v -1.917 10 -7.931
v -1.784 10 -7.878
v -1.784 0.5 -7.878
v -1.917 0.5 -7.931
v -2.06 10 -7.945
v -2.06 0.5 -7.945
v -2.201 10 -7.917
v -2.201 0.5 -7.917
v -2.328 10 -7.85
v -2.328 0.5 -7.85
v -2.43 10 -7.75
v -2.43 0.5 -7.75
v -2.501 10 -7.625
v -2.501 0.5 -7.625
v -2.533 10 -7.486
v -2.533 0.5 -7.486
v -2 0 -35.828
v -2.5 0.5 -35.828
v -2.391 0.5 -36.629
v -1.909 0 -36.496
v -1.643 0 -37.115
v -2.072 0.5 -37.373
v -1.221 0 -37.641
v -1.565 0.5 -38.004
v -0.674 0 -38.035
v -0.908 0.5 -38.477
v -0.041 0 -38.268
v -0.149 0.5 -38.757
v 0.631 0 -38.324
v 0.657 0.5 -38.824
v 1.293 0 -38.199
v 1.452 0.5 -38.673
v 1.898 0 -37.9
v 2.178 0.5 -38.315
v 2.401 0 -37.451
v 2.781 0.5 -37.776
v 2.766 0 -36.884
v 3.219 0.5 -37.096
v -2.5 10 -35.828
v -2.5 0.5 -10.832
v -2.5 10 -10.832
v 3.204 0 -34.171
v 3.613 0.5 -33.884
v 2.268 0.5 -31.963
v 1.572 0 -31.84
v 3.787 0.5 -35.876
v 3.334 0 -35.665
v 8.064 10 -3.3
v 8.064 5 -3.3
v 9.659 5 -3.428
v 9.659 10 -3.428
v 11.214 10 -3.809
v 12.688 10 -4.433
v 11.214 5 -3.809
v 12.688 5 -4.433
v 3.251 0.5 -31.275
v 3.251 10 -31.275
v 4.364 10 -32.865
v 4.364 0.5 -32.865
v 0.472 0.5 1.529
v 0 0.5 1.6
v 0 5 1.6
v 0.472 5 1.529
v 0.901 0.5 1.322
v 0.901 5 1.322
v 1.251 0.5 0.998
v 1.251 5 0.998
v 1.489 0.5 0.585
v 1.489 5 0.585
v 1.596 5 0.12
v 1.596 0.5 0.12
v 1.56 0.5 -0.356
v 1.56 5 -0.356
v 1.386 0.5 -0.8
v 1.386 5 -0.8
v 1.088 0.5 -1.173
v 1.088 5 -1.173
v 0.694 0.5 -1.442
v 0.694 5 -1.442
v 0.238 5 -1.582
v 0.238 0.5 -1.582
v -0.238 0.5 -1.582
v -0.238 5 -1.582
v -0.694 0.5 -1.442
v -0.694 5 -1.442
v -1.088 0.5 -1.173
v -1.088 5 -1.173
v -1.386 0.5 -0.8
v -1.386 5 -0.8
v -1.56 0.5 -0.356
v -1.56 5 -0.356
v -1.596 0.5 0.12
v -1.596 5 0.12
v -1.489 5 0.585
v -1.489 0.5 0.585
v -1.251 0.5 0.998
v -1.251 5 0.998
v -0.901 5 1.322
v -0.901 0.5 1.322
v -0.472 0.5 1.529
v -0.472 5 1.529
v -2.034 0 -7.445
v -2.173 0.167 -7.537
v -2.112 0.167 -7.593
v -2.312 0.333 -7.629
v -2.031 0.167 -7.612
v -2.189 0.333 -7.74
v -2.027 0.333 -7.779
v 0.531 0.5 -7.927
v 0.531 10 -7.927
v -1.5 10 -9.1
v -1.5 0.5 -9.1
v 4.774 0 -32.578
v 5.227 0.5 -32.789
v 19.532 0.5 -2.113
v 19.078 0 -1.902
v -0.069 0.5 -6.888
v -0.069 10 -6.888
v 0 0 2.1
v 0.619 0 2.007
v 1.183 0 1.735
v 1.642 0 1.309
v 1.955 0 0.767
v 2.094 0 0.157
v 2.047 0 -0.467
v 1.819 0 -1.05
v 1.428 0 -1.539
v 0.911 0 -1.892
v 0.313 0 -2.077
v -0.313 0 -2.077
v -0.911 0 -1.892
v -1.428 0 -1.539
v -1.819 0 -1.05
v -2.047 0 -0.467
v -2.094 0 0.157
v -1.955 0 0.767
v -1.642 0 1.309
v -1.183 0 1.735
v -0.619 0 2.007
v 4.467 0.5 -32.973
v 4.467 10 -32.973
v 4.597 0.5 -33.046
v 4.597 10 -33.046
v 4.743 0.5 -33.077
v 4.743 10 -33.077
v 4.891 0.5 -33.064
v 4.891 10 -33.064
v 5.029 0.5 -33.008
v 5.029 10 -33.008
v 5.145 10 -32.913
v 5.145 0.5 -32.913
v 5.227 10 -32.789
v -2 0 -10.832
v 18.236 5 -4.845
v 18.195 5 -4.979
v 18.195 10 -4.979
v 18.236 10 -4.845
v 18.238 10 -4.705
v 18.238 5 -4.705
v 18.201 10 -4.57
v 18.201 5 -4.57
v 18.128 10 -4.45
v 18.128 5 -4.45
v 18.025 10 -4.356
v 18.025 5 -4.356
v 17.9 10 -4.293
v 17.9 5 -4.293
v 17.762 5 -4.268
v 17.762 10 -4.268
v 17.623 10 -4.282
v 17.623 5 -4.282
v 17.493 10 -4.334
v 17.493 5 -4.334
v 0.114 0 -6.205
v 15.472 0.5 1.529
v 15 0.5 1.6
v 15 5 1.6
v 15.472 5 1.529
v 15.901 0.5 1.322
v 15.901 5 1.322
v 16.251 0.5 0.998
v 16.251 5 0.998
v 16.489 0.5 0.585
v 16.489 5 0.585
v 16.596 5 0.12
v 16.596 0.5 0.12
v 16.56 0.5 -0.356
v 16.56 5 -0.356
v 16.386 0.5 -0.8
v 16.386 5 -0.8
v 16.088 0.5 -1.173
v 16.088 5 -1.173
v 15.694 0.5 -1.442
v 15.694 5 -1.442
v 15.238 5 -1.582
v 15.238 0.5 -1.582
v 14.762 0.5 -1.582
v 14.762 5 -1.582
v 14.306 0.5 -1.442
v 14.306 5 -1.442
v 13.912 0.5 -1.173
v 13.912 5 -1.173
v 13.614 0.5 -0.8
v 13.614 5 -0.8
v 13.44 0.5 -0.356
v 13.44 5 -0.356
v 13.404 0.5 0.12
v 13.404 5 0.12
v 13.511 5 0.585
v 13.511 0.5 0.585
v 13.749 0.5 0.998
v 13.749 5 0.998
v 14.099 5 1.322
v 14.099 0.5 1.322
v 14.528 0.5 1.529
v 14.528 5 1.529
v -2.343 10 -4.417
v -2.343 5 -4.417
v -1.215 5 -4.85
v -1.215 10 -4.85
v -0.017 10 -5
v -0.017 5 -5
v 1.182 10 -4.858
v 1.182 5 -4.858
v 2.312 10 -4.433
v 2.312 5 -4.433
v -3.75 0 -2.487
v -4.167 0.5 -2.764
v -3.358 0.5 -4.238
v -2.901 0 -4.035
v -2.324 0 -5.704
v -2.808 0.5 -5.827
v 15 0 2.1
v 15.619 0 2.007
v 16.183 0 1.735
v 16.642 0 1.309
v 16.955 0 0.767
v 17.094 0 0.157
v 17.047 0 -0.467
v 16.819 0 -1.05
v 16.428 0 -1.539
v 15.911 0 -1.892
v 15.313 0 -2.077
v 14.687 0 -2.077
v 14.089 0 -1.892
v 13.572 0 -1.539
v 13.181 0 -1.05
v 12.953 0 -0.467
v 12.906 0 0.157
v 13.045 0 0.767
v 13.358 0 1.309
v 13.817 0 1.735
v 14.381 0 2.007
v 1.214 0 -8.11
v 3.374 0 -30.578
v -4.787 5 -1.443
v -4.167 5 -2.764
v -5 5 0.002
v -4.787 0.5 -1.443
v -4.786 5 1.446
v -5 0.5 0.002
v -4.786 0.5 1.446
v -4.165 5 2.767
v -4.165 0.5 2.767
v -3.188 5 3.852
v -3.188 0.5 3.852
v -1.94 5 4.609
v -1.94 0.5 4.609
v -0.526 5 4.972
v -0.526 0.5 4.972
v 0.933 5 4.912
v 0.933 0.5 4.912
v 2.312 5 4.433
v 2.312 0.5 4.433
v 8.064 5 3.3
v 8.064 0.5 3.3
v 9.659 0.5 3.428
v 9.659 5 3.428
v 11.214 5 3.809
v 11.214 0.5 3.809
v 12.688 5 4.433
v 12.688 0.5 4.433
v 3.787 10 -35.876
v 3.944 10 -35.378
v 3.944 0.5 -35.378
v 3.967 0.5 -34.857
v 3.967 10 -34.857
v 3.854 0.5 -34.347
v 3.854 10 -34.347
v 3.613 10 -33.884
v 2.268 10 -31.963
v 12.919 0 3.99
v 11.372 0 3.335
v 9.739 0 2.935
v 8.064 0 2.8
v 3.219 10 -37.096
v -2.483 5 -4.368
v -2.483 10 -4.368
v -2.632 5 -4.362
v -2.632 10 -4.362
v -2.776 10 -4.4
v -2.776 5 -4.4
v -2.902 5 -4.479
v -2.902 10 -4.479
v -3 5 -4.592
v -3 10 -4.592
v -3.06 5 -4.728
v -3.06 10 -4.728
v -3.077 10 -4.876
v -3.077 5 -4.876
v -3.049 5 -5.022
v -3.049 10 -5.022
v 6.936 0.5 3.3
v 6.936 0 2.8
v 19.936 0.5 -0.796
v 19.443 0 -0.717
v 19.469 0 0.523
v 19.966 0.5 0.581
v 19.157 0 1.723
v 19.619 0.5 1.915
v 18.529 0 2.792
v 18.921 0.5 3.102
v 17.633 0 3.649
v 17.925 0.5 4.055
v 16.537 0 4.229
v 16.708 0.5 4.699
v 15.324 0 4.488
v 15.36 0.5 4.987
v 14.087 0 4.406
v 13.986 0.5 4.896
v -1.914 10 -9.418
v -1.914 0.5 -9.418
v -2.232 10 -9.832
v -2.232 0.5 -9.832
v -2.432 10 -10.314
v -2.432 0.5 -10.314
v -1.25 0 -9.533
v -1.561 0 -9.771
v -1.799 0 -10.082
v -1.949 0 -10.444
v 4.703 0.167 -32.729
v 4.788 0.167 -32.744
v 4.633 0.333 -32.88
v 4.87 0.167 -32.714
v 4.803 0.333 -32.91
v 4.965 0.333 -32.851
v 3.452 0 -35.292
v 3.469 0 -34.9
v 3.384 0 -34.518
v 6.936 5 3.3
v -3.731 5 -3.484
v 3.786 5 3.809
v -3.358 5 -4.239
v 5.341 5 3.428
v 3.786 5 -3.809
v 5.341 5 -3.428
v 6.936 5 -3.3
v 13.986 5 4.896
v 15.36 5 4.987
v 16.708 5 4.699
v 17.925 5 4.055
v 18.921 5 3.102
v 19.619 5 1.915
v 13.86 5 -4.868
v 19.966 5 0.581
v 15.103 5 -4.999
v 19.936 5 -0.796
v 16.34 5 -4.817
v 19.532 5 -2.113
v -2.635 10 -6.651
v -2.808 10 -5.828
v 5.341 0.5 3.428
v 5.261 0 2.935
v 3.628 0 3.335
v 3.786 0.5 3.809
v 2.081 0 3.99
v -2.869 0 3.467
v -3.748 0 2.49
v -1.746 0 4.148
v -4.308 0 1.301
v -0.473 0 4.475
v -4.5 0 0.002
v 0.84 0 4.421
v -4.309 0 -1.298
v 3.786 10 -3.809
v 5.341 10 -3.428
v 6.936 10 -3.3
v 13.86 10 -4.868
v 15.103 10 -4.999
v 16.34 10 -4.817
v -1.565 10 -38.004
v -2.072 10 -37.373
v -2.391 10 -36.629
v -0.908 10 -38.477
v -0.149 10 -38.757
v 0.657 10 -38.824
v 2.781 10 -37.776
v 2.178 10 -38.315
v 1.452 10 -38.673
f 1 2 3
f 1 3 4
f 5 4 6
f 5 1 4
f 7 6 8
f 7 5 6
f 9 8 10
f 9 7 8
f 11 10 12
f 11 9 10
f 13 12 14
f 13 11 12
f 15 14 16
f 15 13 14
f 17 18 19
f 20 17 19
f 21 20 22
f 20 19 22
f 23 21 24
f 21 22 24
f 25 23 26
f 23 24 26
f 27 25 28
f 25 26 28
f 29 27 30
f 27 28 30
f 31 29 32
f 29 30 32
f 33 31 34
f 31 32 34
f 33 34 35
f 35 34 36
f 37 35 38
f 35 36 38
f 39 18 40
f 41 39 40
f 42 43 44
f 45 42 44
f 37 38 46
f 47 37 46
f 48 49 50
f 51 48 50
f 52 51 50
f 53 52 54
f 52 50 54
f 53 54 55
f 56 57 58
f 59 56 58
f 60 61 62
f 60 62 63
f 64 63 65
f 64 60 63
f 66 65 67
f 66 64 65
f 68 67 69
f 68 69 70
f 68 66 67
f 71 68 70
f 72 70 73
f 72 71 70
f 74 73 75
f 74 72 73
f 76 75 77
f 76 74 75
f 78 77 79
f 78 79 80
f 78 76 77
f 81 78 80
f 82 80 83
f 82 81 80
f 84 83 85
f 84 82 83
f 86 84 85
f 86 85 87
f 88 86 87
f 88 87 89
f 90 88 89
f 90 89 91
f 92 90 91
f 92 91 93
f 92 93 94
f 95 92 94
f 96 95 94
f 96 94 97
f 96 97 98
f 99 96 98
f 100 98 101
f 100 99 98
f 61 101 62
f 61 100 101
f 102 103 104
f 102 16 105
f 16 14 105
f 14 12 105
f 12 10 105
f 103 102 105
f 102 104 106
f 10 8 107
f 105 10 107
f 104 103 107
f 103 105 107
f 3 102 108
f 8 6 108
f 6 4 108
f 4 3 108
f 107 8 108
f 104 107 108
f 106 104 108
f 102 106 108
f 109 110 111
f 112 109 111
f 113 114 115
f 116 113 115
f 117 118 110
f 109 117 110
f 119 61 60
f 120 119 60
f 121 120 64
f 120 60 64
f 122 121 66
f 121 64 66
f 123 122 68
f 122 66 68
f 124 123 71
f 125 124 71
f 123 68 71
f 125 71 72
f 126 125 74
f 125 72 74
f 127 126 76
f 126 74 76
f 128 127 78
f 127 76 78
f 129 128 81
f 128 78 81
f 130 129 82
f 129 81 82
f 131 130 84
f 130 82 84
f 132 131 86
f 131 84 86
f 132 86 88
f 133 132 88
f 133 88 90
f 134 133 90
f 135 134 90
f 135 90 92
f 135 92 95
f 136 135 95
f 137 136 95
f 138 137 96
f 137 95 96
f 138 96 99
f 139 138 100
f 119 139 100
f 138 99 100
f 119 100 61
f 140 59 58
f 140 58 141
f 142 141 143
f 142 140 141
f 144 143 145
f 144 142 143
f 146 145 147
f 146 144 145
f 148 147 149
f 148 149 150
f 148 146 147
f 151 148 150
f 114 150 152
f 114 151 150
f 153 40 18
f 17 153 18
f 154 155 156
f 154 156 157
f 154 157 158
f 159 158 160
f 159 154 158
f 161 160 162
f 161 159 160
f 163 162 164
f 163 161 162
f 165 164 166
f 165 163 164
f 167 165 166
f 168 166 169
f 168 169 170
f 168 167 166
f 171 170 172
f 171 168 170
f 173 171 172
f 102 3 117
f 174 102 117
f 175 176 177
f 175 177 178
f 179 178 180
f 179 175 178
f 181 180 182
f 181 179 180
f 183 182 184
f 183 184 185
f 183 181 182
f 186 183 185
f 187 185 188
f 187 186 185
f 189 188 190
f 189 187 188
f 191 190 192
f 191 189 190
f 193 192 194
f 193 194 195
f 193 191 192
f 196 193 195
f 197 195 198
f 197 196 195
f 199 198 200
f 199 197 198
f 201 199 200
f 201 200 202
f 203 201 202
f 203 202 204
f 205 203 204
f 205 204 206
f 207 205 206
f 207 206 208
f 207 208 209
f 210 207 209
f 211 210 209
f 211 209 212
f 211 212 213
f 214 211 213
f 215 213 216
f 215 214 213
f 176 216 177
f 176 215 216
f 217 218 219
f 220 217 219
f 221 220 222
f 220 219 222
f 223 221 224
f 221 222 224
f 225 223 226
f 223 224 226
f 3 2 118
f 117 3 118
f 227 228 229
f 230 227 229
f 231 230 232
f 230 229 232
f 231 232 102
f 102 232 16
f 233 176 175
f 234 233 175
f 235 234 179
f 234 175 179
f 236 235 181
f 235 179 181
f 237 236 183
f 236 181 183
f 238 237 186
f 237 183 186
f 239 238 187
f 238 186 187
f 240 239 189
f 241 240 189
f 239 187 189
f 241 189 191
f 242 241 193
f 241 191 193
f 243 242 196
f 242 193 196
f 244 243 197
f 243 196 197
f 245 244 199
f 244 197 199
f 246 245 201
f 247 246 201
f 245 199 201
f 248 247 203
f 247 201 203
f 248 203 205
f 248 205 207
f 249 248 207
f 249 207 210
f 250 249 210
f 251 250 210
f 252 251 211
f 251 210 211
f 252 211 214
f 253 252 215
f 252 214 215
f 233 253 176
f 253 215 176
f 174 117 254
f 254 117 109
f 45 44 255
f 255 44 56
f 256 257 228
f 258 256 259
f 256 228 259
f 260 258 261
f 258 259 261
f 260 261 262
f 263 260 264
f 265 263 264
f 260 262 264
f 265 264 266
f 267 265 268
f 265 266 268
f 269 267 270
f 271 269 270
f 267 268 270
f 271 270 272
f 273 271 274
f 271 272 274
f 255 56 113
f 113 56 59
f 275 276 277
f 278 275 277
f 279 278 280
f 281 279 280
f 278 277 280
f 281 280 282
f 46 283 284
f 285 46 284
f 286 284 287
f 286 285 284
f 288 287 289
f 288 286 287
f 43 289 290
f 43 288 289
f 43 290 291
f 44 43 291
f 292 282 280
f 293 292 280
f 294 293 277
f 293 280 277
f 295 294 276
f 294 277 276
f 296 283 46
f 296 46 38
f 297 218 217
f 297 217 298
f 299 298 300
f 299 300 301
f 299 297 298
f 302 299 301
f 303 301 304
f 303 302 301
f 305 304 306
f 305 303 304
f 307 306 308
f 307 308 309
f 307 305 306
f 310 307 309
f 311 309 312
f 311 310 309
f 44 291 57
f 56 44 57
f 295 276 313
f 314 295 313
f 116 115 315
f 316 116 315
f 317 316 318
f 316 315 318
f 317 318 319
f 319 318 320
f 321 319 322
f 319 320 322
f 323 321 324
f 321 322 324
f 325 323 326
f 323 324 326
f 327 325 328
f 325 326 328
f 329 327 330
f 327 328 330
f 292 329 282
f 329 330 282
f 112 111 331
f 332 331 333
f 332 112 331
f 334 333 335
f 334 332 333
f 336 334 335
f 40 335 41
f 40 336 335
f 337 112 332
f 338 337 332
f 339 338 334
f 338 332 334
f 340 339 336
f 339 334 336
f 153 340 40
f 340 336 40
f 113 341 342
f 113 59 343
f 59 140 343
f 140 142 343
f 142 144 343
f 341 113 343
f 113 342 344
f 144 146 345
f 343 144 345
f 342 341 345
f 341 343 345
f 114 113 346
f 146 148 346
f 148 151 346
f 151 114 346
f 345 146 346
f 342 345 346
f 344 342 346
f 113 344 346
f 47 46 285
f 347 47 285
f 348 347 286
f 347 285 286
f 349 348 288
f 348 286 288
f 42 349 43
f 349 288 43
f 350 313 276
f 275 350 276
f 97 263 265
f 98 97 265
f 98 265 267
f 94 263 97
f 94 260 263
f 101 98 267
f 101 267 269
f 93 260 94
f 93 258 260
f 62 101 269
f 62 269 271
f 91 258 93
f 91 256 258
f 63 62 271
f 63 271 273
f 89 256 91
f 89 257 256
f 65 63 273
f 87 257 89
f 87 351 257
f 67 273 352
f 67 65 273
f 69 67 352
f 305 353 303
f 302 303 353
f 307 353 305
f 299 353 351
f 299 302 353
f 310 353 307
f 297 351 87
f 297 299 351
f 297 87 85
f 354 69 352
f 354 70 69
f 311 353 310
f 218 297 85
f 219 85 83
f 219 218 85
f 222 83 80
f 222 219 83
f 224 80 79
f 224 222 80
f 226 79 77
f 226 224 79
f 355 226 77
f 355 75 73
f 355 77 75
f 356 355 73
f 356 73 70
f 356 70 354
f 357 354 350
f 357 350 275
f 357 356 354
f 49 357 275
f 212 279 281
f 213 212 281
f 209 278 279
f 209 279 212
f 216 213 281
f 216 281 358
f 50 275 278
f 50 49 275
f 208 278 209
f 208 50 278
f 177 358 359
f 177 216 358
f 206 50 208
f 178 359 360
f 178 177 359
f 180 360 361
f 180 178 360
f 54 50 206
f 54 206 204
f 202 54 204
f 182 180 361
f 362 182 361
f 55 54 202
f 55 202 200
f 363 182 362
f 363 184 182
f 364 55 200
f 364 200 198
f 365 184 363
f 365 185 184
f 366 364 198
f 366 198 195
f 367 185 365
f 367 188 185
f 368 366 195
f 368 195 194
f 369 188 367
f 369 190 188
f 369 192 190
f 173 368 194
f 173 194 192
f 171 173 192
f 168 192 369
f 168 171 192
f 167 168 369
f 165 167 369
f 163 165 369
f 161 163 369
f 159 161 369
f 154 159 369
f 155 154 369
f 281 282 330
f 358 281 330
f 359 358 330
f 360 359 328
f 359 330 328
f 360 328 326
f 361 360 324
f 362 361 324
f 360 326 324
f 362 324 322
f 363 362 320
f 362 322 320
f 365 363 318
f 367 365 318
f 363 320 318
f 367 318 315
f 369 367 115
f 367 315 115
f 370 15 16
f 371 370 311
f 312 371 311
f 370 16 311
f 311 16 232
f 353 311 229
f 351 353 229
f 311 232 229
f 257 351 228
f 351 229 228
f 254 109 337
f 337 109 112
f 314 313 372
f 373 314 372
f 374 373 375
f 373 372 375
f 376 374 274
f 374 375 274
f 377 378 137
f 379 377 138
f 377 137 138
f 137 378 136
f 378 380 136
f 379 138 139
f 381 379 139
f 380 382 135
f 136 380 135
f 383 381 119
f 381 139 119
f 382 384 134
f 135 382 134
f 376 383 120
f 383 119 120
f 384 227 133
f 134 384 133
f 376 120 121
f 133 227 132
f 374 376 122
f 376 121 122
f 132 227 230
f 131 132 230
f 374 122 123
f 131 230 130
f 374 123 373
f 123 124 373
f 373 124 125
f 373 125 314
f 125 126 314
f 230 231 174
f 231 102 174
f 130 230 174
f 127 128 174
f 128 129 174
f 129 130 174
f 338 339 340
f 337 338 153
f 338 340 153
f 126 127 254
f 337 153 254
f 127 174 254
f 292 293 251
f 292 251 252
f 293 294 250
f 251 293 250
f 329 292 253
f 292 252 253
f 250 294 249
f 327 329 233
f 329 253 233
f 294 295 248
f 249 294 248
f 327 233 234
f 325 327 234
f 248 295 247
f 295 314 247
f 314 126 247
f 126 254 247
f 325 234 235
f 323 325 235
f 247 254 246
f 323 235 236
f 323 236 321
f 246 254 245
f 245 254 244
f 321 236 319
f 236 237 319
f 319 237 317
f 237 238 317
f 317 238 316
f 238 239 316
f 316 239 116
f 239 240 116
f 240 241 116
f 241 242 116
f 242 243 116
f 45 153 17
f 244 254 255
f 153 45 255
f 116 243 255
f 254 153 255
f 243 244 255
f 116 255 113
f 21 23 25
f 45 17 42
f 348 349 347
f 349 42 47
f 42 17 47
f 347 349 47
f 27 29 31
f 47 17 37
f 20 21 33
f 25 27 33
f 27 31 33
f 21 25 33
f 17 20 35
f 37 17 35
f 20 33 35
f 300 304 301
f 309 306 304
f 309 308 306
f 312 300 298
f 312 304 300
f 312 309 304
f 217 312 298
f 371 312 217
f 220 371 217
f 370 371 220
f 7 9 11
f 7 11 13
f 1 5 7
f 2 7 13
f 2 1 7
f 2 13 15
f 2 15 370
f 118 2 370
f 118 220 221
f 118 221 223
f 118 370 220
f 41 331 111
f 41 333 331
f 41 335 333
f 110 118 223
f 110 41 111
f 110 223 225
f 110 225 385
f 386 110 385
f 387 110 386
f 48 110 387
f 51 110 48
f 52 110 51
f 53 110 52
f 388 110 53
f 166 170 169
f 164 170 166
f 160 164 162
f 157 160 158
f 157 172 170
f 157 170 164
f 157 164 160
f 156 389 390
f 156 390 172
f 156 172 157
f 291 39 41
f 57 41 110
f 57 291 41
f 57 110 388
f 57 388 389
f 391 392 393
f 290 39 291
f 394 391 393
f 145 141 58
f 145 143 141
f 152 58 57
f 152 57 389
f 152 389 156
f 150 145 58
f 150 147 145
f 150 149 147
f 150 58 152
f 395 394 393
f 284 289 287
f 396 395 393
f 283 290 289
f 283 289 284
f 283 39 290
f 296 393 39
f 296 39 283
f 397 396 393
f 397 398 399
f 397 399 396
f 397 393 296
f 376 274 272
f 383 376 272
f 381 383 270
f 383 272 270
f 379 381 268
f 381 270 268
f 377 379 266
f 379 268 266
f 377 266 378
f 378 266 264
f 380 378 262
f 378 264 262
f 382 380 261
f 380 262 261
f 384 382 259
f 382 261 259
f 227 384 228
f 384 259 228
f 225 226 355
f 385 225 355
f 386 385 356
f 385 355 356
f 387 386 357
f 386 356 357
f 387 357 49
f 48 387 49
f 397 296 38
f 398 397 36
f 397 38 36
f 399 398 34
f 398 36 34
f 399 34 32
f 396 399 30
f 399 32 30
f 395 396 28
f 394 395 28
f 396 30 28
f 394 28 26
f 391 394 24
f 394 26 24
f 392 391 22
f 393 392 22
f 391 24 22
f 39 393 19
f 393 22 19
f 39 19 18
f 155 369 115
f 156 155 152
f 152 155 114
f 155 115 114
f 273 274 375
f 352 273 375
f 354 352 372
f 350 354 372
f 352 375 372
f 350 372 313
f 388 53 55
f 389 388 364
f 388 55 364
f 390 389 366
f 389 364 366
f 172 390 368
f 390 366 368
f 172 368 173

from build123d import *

# Parameters (mm, degrees)
MAIN_BODY_DEPTH                           = 10
SKETCH1_3_R                               = 1.6
CONNECTOR_BODY_DEPTH                      = 5
DULLING_FILLET_START                      = 5
DULLING_FILLET_DEPTH                      = 6
CUT_EXTRUDE1_DEPTH                        = 45.806187552
FILLET1_R                                 = 2
FILLET2_R                                 = 0.5
ELEPHANTSFOOT_COMPENSATION_LEFT_CONF_SIZE = 0.5


with BuildPart() as part:
    # complete_sketch → main_body (new body)
    with BuildSketch(Plane(origin=(0, 0, 0), x_dir=(1, 0, 0), z_dir=(0, 1, 0))):
        with BuildLine():
            ThreePointArc((-2.5, 8.291561976), (-2.925728922, 5.40481063), (-4.166666667, 2.763853992))
            ThreePointArc((-4.166666667, 2.763853992), (-1.24767584, 4.841828683), (2.312045751, 4.433333333))
            ThreePointArc((2.312045751, 4.433333333), (4.555661111, 3.587465144), (6.936137254, 3.3))
            Line((6.936137254, 3.3), (8.063862746, 3.3))
            ThreePointArc((8.063862746, 3.3), (10.444338889, 3.587465144), (12.687954249, 4.433333333))
            ThreePointArc((12.687954249, 4.433333333), (16.605433979, 4.735248857), (19.531538935, 2.113091309))
            Line((19.531538935, 2.113091309), (3.218923361, 37.095608299))
            ThreePointArc((3.218923361, 37.095608299), (-0.149318842, 38.756641535), (-2.5, 35.827753514))
            Line((-2.5, 35.827753514), (-2.5, 8.291561976))
        make_face()
    extrude(amount=MAIN_BODY_DEPTH)

    # Sketch1<3> → connector_body (add)
    with BuildSketch(Plane(origin=(0, 0, 0), x_dir=(1, 0, 0), z_dir=(0, 1, 0))):
        with BuildLine():
            ThreePointArc((2.312045751, -4.433333333), (4.555661111, -3.587465144), (6.936137254, -3.3))
            Line((6.936137254, -3.3), (8.063862746, -3.3))
            ThreePointArc((8.063862746, -3.3), (10.444338889, -3.587465144), (12.687954249, -4.433333333))
            ThreePointArc((12.687954249, -4.433333333), (18.456219958, -3.613107195), (19.531538935, 2.113091309))
            ThreePointArc((19.531538935, 2.113091309), (16.605433979, 4.735248857), (12.687954249, 4.433333333))
            ThreePointArc((12.687954249, 4.433333333), (10.444338889, 3.587465144), (8.063862746, 3.3))
            Line((8.063862746, 3.3), (6.936137254, 3.3))
            ThreePointArc((6.936137254, 3.3), (4.555661111, 3.587465144), (2.312045751, 4.433333333))
            ThreePointArc((2.312045751, 4.433333333), (-1.24767584, 4.841828683), (-4.166666667, 2.763853992))
            ThreePointArc((-4.166666667, 2.763853992), (-3.716151374, -3.345178466), (2.312045751, -4.433333333))
        make_face()
        with Locations(Location((0, 0, 0), (0, 0, 270))):
            Circle(SKETCH1_3_R, mode=Mode.SUBTRACT)
        with Locations(Location((15, 0, 0), (0, 0, 270))):
            Circle(SKETCH1_3_R, mode=Mode.SUBTRACT)
    extrude(amount=CONNECTOR_BODY_DEPTH)

    # dulling_fillet: read off the stored shape, not the designer's step
    # dulling_fillet outline → dulling_fillet (cut)
    with BuildSketch(Plane(origin=(0, 0, 0), x_dir=(1, 0, 0), z_dir=(0, 1, 0)).offset(DULLING_FILLET_START)):
        with BuildLine():
            Line((19.531538935, 2.113091309), (18.195102647, 4.979088177))
            ThreePointArc((18.195102647, 4.979088177), (18.080055144, 4.399425861), (17.492680685, 4.334344587))
            ThreePointArc((17.492680685, 4.334344587), (18.683531845, 3.381063908), (19.531538935, 2.113091309))
        make_face()
        with BuildLine():
            ThreePointArc((-4.166666667, 2.763853992), (-3.358016887, 3.704554303), (-2.342670216, 4.417227214))
            ThreePointArc((-2.342670216, 4.417227214), (-2.902133749, 4.479151002), (-3.049464036, 5.022407651))
            ThreePointArc((-3.049464036, 5.022407651), (-3.536643042, 3.85780149), (-4.166666667, 2.763853992))
        make_face()
    extrude(amount=DULLING_FILLET_DEPTH, mode=Mode.SUBTRACT)

    # Sketch2 → Cut-Extrude1 (cut, through all)
    with BuildSketch(Plane(origin=(0, 10, 0), x_dir=(1, 0, 0), z_dir=(0, 1, 0))):
        Polygon((-2.5, 8.291561976), (-0.068911087, 6.887972137), (0.531088913, 7.927202622), (-2.5, 9.677202622), align=None)
        Polygon((4.275469015, 34.829838831), (2.267951488, 31.962806676), (3.250933941, 31.274514953), (4.861066057, 33.574021924), align=None)
    extrude(amount=-CUT_EXTRUDE1_DEPTH, mode=Mode.SUBTRACT)

    # Fillet1
    fillet1_edges = [part.edges().sort_by_distance(p)[0] for p in [
        (-2.5, 5, -9.677202622),
        (4.275469015, 5, -34.829838831),
    ]]
    fillet(fillet1_edges, radius=FILLET1_R)

    # Fillet2
    fillet2_edges = [part.edges().sort_by_distance(p)[0] for p in [
        (4.861066057, 5, -33.574021924),
        (-2.5, 5, -8.291561976),
    ]]
    fillet(fillet2_edges, radius=FILLET2_R)

    # elephantsfoot_compensation_left_conf
    elephantsfoot_compensation_left_conf_edges = [part.edges().sort_by_distance(p)[0] for p in [
        (-0.484455543, 0, -8.513527487),
        (0.231088913, 0, -7.40758738),
        (3.807634117, 0, -32.069565198),
        (2.759442715, 0, -31.618660815),
        (-2.5, 0, -23.329828337),
        (-0.149318842, 0, -38.756641535),
        (2.940555742, 0, -32.923385101),
        (3.503197421, 0, -36.48598061),
        (-2.232050808, 0, -9.83190316),
        (12.379301571, 0, -17.451113833),
        (3.967245303, 0, -34.856804912),
        (-3.049950658, 0, -5.021001256),
        (-0.926536362, 0, -7.383122321),
        (-2.266493544, 0, -7.888003391),
        (4.817488185, 0, -33.075924575),
        (-3.716151374, 0, 3.345178466),
        (18.456219958, 0, 3.613107195),
        (7.5, 0, 3.3),
        (10.444338889, 0, 3.587465144),
        (0, 0, -1.6),
        (15, 0, -1.6),
        (4.555661111, 0, 3.587465144),
    ]]
    chamfer(elephantsfoot_compensation_left_conf_edges, length=ELEPHANTSFOOT_COMPENSATION_LEFT_CONF_SIZE)


solid = part.part
